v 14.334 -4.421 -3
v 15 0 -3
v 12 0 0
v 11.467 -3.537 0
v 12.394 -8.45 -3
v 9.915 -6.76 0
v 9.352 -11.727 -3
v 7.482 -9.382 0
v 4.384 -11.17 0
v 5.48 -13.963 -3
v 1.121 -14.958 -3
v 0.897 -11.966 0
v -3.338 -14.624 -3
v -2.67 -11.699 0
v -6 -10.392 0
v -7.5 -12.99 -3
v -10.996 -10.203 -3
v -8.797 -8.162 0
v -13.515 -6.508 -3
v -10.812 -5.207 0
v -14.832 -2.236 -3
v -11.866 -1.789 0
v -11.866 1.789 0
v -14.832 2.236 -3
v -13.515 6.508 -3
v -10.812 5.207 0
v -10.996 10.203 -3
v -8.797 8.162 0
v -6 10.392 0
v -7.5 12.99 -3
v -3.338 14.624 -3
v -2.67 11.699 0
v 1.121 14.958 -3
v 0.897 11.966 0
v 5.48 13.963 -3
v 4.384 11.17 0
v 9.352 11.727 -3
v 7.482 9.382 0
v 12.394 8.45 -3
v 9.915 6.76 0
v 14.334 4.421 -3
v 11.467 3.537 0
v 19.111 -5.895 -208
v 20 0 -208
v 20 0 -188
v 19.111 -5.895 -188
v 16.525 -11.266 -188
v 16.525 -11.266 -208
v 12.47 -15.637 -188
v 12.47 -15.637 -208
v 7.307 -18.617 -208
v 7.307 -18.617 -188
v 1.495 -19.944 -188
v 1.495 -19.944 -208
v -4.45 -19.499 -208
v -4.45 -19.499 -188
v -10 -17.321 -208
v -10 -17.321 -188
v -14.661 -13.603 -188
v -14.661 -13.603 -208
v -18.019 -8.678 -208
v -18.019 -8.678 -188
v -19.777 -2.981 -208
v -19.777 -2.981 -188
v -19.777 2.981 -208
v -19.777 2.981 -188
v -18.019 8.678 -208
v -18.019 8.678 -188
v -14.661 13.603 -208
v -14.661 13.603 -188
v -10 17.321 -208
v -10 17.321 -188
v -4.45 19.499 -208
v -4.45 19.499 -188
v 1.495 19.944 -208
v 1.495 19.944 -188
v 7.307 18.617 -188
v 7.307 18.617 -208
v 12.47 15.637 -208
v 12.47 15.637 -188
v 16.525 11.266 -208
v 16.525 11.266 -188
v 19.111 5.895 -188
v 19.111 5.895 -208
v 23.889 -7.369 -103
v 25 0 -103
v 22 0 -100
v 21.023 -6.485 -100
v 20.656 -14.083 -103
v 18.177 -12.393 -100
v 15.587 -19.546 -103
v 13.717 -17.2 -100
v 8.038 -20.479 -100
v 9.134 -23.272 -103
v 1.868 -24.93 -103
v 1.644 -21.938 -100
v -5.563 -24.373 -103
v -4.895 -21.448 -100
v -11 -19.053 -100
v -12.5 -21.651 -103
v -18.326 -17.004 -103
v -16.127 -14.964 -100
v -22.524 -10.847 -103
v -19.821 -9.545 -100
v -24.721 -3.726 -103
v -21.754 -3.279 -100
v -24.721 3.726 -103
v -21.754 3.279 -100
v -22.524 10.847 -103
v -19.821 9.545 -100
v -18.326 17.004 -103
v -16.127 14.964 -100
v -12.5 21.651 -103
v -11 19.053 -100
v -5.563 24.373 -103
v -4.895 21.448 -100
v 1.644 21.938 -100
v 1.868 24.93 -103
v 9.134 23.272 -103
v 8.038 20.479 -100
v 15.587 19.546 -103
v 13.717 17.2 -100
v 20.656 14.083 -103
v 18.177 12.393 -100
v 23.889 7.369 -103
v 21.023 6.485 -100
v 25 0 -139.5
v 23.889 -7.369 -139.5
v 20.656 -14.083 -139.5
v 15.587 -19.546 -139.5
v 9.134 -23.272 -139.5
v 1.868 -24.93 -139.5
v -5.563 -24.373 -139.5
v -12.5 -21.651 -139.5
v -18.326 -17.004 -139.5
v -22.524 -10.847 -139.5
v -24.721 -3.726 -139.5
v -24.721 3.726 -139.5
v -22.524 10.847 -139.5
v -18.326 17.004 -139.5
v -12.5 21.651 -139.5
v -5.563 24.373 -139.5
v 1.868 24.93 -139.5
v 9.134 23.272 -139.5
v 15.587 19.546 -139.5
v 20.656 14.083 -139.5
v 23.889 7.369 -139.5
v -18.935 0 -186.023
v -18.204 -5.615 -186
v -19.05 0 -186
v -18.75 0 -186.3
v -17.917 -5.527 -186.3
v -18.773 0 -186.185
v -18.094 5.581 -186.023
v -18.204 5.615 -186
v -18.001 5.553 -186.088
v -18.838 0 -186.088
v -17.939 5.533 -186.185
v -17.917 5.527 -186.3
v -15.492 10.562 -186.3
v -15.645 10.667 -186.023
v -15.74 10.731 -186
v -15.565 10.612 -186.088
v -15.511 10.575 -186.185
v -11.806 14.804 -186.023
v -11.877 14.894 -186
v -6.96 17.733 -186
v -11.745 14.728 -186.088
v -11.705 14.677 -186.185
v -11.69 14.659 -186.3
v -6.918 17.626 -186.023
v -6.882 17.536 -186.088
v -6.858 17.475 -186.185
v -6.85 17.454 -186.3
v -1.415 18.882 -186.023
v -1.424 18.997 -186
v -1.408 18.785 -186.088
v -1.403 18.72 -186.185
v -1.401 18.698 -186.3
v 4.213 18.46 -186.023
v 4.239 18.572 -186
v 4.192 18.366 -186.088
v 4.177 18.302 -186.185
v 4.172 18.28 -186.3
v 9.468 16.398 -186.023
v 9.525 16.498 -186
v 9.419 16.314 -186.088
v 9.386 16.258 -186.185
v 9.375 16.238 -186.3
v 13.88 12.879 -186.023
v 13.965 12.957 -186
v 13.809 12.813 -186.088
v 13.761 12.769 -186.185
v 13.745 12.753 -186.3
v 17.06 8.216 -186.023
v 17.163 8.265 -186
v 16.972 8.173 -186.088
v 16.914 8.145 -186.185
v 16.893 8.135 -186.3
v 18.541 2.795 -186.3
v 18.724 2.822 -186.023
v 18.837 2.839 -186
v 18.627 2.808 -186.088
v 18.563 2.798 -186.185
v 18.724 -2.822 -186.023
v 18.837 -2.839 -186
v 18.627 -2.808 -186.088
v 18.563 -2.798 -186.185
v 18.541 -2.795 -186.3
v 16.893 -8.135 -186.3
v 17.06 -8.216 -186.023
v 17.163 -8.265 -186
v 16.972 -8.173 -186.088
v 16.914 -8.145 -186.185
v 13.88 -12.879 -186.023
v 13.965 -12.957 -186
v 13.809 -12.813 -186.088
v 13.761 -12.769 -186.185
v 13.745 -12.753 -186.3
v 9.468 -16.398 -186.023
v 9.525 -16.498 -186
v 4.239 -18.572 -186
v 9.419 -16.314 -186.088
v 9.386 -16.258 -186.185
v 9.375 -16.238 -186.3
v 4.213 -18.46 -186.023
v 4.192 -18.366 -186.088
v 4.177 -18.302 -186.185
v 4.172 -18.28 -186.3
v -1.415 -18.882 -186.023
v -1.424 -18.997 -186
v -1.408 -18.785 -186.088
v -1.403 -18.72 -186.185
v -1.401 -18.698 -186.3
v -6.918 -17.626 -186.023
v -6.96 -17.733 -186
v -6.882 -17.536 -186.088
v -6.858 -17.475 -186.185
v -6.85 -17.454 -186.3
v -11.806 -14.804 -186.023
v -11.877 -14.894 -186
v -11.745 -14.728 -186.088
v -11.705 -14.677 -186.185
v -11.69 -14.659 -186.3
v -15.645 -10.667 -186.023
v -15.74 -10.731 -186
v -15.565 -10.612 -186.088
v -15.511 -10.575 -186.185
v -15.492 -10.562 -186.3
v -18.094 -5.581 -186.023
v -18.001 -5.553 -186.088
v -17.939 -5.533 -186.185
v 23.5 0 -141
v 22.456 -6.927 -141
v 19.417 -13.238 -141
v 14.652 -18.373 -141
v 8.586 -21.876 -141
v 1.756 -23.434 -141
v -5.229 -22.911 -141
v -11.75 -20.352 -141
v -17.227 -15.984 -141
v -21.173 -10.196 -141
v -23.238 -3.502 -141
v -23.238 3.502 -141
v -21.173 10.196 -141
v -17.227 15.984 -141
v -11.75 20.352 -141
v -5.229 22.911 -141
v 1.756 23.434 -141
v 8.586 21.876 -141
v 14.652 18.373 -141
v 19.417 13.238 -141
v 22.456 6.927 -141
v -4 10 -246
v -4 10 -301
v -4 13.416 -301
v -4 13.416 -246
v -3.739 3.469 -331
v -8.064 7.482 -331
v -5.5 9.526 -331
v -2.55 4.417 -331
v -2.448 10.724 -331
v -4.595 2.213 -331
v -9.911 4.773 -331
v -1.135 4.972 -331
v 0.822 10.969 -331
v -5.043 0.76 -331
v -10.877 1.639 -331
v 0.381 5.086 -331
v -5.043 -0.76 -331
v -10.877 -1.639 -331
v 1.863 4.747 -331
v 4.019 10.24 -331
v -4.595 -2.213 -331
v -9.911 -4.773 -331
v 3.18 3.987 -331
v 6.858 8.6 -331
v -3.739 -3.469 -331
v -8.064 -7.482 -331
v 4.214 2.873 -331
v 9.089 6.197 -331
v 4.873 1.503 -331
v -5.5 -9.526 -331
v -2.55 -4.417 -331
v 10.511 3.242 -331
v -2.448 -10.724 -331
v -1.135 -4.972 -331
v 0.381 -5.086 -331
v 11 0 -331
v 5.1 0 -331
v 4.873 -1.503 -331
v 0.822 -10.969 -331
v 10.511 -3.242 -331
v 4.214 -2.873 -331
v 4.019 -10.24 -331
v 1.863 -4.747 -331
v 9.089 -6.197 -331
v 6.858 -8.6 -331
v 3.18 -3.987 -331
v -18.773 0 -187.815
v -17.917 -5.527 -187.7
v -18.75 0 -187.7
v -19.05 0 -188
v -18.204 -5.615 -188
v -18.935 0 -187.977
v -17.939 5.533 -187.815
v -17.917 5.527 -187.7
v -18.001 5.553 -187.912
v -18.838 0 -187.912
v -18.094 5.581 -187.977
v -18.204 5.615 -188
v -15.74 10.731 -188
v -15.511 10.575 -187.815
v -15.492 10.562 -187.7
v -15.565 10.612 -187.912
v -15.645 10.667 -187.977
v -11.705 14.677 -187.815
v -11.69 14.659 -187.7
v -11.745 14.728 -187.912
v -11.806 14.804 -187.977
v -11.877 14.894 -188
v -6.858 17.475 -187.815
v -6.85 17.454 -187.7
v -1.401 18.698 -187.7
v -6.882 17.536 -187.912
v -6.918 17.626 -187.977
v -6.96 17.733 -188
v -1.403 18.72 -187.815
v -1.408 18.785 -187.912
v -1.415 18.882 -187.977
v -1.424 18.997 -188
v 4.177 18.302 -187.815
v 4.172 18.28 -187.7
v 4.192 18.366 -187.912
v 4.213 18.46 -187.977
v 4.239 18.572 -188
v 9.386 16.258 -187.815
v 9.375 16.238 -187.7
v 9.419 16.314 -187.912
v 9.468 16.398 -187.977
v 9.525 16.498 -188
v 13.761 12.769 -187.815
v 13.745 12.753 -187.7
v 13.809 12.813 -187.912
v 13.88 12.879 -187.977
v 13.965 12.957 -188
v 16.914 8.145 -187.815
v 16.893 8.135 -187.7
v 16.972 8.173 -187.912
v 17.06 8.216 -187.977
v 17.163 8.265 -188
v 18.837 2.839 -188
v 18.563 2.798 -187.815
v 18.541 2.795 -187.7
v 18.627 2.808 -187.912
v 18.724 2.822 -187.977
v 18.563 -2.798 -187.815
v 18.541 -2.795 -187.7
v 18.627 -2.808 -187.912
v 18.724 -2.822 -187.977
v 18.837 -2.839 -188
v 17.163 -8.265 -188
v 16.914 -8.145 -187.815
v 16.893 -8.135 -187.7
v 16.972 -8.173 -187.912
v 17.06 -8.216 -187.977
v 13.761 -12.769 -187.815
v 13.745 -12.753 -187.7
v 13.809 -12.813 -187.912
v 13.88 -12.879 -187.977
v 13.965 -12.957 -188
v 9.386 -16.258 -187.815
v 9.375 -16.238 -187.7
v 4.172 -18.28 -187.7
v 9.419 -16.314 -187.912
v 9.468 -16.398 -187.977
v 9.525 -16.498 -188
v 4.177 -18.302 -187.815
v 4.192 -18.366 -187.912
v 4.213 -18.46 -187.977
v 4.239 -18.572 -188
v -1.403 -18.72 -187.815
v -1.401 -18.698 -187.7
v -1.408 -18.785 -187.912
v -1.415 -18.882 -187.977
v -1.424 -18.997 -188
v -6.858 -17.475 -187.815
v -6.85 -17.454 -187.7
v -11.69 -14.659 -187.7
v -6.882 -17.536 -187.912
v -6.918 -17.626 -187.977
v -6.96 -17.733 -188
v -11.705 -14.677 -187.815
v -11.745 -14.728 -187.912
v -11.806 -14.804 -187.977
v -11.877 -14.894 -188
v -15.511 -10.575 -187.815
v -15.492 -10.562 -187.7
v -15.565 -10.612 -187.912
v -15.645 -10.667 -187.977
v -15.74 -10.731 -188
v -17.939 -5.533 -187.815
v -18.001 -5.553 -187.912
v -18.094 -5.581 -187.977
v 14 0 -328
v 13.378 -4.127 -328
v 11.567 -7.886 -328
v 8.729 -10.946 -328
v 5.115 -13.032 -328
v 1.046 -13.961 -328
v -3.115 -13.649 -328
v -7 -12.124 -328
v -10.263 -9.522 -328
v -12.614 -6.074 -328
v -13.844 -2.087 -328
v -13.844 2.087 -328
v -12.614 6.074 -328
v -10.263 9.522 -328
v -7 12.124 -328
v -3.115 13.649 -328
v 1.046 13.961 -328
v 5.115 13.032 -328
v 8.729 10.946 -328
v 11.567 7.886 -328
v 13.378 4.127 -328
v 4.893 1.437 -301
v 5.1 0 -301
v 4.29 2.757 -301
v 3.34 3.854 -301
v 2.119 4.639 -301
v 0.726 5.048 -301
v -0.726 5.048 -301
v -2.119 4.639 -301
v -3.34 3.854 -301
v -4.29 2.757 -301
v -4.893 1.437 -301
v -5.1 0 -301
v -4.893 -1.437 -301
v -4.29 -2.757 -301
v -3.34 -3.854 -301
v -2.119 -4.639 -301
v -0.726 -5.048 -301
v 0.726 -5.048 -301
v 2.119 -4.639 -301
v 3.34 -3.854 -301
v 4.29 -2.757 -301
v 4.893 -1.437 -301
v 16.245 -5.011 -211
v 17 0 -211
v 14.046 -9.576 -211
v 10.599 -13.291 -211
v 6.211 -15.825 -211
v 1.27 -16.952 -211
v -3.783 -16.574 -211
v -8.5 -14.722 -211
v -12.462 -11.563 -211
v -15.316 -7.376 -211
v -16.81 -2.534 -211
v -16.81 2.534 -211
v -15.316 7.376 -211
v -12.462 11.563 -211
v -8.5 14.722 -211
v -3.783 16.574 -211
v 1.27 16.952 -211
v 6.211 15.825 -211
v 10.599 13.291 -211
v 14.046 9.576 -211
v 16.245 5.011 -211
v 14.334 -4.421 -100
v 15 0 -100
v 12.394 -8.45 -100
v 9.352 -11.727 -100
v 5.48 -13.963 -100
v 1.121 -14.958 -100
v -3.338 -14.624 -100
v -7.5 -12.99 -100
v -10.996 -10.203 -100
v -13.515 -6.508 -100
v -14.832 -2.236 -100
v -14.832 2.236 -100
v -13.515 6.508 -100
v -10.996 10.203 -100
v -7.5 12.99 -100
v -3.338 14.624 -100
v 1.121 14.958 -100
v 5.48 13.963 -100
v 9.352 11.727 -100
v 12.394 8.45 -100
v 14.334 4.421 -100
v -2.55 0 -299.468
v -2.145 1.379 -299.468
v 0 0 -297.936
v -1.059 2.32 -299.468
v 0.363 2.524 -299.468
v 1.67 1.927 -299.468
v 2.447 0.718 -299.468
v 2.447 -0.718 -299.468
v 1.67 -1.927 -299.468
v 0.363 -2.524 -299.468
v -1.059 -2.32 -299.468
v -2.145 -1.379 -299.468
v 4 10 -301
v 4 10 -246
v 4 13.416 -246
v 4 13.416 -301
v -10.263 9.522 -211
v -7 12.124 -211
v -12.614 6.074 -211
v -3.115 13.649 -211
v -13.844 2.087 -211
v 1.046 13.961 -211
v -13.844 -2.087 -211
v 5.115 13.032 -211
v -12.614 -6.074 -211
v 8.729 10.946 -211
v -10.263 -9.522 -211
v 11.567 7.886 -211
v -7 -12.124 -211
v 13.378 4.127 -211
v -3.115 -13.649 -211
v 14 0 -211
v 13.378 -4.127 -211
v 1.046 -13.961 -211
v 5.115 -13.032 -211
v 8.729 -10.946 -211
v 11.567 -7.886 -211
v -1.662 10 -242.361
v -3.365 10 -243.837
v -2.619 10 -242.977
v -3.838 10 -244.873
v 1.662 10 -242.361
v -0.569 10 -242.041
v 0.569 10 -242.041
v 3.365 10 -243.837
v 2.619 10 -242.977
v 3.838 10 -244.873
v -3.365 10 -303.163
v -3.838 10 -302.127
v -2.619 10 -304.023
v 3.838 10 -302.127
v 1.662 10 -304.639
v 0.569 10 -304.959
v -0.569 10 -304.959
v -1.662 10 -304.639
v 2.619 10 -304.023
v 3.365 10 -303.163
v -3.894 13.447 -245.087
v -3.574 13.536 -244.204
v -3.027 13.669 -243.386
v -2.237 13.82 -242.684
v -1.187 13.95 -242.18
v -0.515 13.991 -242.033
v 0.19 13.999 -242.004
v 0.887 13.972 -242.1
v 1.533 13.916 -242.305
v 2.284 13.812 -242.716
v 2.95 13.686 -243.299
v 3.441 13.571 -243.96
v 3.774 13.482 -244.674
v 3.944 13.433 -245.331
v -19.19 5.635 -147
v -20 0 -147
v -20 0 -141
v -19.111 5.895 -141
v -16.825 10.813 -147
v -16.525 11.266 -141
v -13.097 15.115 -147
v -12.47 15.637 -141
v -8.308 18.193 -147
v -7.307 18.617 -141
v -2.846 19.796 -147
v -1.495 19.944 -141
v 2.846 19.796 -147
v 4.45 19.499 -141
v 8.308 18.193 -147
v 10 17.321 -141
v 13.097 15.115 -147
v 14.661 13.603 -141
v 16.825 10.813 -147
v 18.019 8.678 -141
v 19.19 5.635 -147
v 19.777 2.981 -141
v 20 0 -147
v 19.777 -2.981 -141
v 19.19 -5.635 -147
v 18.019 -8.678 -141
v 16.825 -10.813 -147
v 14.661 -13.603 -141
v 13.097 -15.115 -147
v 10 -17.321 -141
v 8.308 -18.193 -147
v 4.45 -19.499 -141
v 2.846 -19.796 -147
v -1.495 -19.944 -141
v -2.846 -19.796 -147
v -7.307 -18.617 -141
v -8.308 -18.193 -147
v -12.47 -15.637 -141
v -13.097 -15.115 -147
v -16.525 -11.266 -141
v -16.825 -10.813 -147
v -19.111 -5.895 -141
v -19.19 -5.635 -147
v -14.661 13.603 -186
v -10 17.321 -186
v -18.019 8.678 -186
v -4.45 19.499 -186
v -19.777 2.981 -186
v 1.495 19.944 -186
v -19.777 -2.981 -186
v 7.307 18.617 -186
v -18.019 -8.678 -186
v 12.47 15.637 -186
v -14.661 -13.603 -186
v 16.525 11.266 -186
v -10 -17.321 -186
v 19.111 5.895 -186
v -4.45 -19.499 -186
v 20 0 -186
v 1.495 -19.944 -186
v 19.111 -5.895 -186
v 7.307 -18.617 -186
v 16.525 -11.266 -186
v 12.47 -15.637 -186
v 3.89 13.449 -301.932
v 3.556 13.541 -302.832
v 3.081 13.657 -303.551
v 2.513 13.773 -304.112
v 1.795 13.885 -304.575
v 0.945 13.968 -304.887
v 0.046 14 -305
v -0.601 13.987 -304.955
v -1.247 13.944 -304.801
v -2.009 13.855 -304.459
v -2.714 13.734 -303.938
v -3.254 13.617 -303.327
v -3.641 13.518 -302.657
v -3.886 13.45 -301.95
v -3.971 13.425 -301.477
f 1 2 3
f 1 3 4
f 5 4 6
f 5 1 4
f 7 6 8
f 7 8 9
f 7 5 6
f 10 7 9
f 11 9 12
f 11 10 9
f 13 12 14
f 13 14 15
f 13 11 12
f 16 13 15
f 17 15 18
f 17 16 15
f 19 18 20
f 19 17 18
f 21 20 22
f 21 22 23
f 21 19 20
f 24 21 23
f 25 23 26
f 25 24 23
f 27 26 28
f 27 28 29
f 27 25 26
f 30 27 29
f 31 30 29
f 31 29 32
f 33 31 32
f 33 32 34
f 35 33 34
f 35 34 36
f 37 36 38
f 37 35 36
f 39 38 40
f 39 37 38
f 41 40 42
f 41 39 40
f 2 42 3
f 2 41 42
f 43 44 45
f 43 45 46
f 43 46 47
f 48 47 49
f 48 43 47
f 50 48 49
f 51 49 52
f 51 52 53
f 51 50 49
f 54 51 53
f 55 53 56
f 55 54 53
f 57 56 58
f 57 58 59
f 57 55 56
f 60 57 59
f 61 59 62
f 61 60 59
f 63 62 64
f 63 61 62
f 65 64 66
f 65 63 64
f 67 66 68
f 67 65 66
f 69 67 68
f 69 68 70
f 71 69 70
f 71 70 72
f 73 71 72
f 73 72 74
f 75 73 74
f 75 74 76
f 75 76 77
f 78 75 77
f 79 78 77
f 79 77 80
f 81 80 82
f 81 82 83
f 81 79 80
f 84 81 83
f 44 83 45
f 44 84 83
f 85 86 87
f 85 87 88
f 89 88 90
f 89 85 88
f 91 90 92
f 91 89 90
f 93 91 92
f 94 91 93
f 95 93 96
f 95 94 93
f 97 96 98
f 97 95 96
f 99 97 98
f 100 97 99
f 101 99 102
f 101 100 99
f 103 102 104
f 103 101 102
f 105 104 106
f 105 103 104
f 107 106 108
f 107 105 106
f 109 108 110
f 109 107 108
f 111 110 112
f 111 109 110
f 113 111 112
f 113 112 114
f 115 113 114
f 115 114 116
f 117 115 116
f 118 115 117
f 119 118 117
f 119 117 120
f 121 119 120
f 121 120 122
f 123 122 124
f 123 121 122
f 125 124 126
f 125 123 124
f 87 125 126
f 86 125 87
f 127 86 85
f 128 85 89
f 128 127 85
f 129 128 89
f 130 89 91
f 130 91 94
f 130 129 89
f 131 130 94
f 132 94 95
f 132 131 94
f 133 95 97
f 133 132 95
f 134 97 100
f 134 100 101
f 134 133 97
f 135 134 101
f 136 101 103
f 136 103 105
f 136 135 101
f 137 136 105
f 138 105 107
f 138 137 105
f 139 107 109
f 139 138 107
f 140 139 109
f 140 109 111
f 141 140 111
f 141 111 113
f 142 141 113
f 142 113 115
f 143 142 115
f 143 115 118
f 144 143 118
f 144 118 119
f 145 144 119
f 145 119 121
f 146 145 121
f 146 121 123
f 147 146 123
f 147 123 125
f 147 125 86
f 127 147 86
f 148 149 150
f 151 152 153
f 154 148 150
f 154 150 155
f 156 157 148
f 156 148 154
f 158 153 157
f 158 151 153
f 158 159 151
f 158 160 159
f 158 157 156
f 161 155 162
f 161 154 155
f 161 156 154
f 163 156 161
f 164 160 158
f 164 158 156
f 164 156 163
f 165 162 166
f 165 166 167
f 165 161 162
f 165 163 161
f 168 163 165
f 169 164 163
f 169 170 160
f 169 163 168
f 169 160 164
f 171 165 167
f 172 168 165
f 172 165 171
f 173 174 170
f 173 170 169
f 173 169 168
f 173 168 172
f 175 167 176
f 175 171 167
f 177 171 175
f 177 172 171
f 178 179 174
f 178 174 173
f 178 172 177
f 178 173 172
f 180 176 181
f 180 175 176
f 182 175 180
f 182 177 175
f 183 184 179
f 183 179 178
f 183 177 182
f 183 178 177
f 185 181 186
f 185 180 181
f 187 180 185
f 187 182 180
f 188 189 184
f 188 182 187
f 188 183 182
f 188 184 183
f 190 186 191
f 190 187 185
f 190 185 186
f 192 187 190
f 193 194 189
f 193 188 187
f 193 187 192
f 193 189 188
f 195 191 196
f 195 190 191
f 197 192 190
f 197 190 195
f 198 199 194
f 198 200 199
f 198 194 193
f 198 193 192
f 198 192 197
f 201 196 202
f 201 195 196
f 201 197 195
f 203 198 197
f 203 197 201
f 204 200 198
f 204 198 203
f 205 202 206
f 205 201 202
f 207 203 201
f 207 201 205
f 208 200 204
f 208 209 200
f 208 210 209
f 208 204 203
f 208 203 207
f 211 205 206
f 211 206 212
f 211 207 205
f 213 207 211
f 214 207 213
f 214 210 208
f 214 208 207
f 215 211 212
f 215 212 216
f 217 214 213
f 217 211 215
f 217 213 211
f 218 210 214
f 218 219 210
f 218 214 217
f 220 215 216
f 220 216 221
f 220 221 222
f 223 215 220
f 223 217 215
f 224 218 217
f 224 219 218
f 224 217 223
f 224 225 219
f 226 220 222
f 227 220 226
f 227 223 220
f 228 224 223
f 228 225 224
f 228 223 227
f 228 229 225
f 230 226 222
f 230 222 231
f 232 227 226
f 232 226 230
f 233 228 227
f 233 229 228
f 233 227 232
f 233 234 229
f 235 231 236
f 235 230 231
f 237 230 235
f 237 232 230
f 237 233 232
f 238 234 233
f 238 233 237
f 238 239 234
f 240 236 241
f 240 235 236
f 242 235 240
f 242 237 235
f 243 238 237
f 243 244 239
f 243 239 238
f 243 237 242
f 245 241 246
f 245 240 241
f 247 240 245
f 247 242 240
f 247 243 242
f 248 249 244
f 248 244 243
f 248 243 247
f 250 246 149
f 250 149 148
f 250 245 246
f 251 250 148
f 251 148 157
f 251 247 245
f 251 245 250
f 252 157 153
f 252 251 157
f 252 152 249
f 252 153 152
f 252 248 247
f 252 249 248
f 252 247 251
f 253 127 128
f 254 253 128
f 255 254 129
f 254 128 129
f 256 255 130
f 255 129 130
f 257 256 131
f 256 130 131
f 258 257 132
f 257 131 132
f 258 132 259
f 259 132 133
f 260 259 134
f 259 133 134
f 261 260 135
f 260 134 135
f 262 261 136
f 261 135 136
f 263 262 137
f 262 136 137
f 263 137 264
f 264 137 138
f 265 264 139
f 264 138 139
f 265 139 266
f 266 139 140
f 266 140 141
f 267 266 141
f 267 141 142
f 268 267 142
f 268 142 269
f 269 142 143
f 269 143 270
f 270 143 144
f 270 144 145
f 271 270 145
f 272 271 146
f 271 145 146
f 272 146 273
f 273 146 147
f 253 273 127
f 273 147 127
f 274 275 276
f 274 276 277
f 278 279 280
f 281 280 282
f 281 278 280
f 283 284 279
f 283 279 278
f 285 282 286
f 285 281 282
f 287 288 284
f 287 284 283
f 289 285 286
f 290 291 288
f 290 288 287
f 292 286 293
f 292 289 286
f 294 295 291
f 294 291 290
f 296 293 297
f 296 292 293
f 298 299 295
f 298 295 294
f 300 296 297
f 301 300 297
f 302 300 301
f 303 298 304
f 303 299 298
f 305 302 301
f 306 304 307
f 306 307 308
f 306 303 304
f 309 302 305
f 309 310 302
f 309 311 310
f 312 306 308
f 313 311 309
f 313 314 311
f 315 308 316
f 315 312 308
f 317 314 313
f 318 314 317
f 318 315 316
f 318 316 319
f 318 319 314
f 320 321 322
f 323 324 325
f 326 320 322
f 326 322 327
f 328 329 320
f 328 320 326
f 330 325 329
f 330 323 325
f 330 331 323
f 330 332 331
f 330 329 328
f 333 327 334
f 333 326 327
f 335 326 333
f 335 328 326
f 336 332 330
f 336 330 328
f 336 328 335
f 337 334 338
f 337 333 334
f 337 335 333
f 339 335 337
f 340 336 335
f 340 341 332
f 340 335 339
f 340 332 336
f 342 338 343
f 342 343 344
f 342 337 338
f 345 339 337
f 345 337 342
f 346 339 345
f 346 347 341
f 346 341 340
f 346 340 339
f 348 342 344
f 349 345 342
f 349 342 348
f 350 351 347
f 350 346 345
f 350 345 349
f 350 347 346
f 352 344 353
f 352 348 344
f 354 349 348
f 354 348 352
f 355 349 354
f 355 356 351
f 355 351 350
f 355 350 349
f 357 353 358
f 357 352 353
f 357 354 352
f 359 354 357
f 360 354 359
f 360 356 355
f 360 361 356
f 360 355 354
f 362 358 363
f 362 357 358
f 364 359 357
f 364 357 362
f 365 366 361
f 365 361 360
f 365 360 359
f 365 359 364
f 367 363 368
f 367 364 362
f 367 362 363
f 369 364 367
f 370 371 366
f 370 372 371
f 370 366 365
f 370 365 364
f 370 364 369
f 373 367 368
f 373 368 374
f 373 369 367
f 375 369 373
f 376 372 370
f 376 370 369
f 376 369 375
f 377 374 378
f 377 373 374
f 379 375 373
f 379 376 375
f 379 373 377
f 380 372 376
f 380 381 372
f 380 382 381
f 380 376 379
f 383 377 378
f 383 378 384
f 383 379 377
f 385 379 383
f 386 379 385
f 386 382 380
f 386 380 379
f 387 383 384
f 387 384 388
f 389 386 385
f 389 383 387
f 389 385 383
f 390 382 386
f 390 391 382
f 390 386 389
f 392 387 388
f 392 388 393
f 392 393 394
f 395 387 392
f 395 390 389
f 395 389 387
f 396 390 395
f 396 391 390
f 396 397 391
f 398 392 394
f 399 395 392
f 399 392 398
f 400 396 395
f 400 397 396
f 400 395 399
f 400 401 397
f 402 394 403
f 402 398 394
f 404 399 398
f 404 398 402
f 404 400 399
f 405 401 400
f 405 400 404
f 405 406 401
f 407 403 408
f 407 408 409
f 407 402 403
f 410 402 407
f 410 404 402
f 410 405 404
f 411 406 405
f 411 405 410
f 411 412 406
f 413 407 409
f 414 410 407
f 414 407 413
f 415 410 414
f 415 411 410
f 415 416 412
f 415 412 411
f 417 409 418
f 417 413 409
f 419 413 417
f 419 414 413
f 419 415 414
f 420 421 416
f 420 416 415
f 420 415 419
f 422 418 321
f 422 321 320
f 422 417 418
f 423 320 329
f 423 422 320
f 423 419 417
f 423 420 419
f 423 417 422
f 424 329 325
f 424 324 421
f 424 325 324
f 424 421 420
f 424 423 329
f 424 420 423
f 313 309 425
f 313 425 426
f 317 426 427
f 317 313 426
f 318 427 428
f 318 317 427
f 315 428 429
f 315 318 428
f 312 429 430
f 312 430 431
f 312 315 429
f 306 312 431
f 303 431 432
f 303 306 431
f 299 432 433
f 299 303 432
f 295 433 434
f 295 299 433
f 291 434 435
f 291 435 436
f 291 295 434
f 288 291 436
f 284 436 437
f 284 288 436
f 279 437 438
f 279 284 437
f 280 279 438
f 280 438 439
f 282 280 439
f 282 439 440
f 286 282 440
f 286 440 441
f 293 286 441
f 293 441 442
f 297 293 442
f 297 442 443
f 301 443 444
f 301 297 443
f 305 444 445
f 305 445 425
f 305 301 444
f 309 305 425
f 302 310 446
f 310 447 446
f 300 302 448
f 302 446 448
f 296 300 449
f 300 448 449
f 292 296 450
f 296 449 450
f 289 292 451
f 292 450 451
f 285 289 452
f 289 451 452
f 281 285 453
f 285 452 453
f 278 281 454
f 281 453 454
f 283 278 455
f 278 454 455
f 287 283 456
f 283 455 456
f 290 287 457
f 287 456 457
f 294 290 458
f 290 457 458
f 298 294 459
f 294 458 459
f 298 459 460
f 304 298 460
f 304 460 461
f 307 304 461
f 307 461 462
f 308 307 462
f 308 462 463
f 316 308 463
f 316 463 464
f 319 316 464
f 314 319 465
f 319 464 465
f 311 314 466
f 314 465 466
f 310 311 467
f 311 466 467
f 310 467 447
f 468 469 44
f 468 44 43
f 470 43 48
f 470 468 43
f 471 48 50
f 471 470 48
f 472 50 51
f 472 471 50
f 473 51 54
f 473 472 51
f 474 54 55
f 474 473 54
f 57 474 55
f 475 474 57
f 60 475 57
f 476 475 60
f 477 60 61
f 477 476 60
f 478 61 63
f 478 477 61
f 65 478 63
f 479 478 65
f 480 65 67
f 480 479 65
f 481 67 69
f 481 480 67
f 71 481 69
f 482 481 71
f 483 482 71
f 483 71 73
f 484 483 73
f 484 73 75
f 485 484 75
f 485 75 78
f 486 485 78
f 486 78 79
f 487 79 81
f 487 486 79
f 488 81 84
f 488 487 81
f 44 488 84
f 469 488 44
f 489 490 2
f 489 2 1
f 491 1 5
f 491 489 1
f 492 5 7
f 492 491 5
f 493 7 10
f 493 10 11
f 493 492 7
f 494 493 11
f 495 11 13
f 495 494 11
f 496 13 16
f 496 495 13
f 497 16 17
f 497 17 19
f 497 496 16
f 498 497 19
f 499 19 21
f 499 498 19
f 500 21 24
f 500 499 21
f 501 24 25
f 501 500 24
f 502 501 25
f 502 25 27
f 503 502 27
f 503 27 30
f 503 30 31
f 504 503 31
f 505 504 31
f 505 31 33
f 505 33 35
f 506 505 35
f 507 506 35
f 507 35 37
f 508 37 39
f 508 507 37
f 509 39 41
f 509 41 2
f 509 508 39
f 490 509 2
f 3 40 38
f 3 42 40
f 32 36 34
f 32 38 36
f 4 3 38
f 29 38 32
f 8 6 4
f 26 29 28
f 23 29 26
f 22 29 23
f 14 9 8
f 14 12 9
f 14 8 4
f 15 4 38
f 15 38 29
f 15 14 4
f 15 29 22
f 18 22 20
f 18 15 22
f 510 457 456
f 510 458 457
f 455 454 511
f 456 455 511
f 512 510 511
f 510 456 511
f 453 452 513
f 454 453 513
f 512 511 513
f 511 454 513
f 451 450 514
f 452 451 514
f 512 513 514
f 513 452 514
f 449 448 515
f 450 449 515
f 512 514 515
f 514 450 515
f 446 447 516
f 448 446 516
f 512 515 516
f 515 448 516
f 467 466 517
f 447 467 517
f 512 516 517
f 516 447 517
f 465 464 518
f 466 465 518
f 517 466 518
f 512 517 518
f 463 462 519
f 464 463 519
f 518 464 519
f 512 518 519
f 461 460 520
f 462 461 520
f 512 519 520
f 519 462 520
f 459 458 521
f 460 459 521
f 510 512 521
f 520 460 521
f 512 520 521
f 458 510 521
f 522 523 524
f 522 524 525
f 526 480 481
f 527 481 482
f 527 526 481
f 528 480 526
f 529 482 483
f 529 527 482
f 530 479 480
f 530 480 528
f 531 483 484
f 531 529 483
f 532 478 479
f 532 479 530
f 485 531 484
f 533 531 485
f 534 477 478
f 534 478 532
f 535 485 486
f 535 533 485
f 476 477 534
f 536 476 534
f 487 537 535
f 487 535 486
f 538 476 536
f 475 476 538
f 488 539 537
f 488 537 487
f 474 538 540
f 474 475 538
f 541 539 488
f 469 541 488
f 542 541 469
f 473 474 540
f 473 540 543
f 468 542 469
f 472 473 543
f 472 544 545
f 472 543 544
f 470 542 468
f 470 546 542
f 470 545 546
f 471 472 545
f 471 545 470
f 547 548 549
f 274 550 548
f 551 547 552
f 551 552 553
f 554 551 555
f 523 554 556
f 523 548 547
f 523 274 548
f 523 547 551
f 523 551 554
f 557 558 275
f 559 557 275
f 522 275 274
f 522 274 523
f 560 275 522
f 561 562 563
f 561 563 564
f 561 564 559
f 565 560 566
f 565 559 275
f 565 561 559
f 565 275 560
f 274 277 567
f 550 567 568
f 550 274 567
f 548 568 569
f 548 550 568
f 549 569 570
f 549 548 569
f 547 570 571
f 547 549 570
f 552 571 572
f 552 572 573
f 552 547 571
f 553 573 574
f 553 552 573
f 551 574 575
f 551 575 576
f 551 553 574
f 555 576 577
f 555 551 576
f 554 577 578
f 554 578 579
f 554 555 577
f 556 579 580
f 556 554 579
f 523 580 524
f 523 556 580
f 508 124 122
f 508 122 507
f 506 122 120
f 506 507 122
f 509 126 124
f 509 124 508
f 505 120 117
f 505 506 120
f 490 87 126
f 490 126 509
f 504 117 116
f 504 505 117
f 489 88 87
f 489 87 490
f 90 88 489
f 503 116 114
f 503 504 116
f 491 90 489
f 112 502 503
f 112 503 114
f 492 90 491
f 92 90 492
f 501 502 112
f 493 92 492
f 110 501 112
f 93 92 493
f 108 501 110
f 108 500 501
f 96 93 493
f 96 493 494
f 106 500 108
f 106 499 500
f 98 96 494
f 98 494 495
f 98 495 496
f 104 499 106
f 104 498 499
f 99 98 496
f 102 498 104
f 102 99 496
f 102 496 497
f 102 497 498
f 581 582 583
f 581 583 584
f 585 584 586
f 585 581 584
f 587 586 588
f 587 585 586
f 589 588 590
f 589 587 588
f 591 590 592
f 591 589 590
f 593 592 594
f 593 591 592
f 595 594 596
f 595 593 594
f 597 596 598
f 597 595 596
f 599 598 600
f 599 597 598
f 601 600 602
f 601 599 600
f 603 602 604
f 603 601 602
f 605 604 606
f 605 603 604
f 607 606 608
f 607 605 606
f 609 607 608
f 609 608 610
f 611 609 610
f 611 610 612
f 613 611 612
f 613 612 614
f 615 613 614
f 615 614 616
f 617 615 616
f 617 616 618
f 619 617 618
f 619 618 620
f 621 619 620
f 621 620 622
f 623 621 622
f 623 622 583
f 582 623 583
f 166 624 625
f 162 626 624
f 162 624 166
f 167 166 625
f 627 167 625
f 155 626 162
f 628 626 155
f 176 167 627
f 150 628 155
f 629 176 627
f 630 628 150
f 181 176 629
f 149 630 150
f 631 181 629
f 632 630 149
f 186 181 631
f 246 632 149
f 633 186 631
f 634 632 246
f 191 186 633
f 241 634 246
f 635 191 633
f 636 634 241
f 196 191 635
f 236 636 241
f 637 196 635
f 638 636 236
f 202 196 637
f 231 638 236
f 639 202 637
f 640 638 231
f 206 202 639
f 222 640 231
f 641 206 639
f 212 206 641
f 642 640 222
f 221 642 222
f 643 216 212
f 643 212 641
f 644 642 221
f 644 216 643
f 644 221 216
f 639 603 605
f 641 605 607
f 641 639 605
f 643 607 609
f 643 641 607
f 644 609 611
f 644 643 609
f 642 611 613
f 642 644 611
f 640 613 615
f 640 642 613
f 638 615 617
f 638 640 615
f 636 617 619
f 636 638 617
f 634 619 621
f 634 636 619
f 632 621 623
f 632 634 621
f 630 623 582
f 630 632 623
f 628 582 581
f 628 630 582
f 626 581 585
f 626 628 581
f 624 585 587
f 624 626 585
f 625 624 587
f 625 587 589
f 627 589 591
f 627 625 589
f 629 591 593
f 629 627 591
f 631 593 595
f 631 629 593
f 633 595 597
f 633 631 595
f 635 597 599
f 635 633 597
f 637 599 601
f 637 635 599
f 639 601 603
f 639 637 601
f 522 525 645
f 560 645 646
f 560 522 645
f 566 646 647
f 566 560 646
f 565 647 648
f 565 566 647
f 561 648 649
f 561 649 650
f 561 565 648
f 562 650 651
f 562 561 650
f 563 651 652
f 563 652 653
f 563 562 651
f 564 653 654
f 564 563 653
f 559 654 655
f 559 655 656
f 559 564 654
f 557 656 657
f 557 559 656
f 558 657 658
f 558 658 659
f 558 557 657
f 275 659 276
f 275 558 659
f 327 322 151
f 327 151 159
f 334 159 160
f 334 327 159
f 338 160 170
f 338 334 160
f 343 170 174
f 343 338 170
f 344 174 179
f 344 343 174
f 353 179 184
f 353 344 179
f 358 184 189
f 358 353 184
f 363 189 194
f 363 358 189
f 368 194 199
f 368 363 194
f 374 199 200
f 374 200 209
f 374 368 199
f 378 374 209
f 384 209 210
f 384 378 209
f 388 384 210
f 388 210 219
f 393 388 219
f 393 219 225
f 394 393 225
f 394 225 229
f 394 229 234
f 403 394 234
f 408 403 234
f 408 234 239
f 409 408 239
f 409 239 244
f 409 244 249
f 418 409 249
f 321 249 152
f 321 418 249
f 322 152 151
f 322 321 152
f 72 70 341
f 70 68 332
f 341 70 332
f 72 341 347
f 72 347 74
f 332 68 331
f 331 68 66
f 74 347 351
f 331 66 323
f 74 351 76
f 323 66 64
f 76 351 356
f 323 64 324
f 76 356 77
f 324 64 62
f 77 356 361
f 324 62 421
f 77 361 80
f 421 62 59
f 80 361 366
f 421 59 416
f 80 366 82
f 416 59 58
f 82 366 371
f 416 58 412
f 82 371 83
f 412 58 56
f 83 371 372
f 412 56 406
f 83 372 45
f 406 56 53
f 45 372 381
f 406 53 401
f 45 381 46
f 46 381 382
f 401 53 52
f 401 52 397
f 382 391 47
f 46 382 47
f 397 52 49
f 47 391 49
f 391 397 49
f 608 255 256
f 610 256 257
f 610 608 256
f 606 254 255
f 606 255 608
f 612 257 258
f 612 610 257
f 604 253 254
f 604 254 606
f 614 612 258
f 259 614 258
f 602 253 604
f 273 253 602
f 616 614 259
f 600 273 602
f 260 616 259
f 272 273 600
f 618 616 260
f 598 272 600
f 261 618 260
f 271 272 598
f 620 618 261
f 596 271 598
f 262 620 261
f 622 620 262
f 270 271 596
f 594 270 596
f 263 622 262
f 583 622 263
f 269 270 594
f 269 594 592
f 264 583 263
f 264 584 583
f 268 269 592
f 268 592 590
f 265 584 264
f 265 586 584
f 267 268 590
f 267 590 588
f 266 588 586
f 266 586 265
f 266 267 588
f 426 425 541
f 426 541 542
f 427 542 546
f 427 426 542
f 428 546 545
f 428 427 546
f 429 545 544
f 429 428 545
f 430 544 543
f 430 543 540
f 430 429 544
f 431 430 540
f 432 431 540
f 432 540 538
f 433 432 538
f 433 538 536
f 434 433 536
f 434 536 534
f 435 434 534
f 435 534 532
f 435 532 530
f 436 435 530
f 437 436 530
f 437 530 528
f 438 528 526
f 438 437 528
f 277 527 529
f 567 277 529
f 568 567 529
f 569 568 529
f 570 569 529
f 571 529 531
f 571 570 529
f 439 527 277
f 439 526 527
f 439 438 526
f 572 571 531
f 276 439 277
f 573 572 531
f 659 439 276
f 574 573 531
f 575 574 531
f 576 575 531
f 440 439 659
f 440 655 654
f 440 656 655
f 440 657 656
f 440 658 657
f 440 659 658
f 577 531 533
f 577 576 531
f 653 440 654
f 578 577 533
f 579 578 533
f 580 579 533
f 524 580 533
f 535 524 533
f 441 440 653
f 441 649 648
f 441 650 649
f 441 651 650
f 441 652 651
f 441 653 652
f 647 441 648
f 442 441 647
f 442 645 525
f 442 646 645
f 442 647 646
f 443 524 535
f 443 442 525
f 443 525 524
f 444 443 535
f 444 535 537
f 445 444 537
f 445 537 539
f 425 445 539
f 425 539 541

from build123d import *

# Parameters (mm, degrees)
CHAMFER_1_SIZE         = 3
HOLE_WIZARD_M121_D     = 10.2
HOLE_WIZARD_M121_DEPTH = 30
HOLE_WIZARD_M121_TIP   = 3.064389157
SKETCH_4_R             = 20
SKETCH_4_R_2           = 18.75
CUT_EXTRUDE_1_DEPTH    = 2
FILLET_1_R             = 0.3
CHAMFER_2_SIZE         = 1.5
CUT_EXTRUDE_2_DEPTH    = 334.782863551
SKETCH_9_R             = 25
SKETCH_9_R_2           = 20
CUT_EXTRUDE_4_DEPTH    = 6
CHAMFER_3_SIZE         = 1.5
CHAMFER_4_SIZE         = 3


with BuildPart() as part:
    # Эскиз1 → Повернуть1 (revolve)
    with BuildSketch(Plane(origin=(0, 0, 0), x_dir=(0, 0, -1), z_dir=(1, 0, 0))):
        Polygon((0, 0), (0, 15), (100, 15), (100, 25), (147, 25), (147, 20), (211, 20), (211, 14), (331, 14), (331, 0), align=None)
    revolve(axis=Axis((0, 0, 0), (0, 0, -1)))

    # Фаска1
    chamfer_1_edges = [part.edges().sort_by_distance(p)[0] for p in [
        (0, -25, -100),
        (0, -15, 0),
        (0, -14, -331),
    ]]
    chamfer(chamfer_1_edges, length=CHAMFER_1_SIZE)

    # Отверстие обработанное метчиком M121
    with Locations(Plane(origin=(0, 0, -331), x_dir=(-1, 0, 0), z_dir=(0, 0, -1))):
        with Locations((0, 0)):
            Hole(HOLE_WIZARD_M121_D / 2, depth=HOLE_WIZARD_M121_DEPTH)
            with Locations((0, 0, -(HOLE_WIZARD_M121_DEPTH + HOLE_WIZARD_M121_TIP / 2))):  # 118° drill point
                Cone(0, HOLE_WIZARD_M121_D / 2, HOLE_WIZARD_M121_TIP, mode=Mode.SUBTRACT)

    # Эскиз4 → Вырез-Вытянуть1 (cut)
    with BuildSketch(Plane(origin=(0, 0, -188), x_dir=(-1, 0, 0), z_dir=(0, 0, -1))):
        Circle(SKETCH_4_R)
        Circle(SKETCH_4_R_2, mode=Mode.SUBTRACT)
    extrude(amount=-CUT_EXTRUDE_1_DEPTH, mode=Mode.SUBTRACT)

    # Скругление1
    fillet_1_edges = [part.edges().sort_by_distance(p)[0] for p in [
        (18.75, 0, -186),
        (18.75, 0, -188),
    ]]
    fillet(fillet_1_edges, radius=FILLET_1_R)

    # Фаска2
    chamfer_2_edges = [part.edges().sort_by_distance(p)[0] for p in [
        (0, -25, -147),
    ]]
    chamfer(chamfer_2_edges, length=CHAMFER_2_SIZE)

    # Эскиз8 → Вырез-Вытянуть2 (cut, through all)
    with BuildSketch(Plane(origin=(0, 10, -331), x_dir=(-1, 0, 0), z_dir=(0, -1, 0))):
        with BuildLine():
            Line((4, -30), (4, -85))
            ThreePointArc((4, -85), (0, -89), (-4, -85))
            Line((-4, -85), (-4, -30))
            ThreePointArc((-4, -30), (0, -26), (4, -30))
        make_face()
    extrude(amount=-CUT_EXTRUDE_2_DEPTH, mode=Mode.SUBTRACT)

    # Эскиз9 → Вырез-Вытянуть4 (cut)
    with BuildSketch(Plane(origin=(0, 0, -147), x_dir=(-1, 0, 0), z_dir=(0, 0, -1))):
        Circle(SKETCH_9_R)
        Circle(SKETCH_9_R_2, mode=Mode.SUBTRACT)
    extrude(amount=-CUT_EXTRUDE_4_DEPTH, mode=Mode.SUBTRACT)

    # Фаска3
    chamfer_3_edges = [part.edges().sort_by_distance(p)[0] for p in [
        (0, -25, -141),
    ]]
    chamfer(chamfer_3_edges, length=CHAMFER_3_SIZE)

    # Фаска4
    chamfer_4_edges = [part.edges().sort_by_distance(p)[0] for p in [
        (0, -20, -211),
    ]]
    chamfer(chamfer_4_edges, length=CHAMFER_4_SIZE)


solid = part.part
